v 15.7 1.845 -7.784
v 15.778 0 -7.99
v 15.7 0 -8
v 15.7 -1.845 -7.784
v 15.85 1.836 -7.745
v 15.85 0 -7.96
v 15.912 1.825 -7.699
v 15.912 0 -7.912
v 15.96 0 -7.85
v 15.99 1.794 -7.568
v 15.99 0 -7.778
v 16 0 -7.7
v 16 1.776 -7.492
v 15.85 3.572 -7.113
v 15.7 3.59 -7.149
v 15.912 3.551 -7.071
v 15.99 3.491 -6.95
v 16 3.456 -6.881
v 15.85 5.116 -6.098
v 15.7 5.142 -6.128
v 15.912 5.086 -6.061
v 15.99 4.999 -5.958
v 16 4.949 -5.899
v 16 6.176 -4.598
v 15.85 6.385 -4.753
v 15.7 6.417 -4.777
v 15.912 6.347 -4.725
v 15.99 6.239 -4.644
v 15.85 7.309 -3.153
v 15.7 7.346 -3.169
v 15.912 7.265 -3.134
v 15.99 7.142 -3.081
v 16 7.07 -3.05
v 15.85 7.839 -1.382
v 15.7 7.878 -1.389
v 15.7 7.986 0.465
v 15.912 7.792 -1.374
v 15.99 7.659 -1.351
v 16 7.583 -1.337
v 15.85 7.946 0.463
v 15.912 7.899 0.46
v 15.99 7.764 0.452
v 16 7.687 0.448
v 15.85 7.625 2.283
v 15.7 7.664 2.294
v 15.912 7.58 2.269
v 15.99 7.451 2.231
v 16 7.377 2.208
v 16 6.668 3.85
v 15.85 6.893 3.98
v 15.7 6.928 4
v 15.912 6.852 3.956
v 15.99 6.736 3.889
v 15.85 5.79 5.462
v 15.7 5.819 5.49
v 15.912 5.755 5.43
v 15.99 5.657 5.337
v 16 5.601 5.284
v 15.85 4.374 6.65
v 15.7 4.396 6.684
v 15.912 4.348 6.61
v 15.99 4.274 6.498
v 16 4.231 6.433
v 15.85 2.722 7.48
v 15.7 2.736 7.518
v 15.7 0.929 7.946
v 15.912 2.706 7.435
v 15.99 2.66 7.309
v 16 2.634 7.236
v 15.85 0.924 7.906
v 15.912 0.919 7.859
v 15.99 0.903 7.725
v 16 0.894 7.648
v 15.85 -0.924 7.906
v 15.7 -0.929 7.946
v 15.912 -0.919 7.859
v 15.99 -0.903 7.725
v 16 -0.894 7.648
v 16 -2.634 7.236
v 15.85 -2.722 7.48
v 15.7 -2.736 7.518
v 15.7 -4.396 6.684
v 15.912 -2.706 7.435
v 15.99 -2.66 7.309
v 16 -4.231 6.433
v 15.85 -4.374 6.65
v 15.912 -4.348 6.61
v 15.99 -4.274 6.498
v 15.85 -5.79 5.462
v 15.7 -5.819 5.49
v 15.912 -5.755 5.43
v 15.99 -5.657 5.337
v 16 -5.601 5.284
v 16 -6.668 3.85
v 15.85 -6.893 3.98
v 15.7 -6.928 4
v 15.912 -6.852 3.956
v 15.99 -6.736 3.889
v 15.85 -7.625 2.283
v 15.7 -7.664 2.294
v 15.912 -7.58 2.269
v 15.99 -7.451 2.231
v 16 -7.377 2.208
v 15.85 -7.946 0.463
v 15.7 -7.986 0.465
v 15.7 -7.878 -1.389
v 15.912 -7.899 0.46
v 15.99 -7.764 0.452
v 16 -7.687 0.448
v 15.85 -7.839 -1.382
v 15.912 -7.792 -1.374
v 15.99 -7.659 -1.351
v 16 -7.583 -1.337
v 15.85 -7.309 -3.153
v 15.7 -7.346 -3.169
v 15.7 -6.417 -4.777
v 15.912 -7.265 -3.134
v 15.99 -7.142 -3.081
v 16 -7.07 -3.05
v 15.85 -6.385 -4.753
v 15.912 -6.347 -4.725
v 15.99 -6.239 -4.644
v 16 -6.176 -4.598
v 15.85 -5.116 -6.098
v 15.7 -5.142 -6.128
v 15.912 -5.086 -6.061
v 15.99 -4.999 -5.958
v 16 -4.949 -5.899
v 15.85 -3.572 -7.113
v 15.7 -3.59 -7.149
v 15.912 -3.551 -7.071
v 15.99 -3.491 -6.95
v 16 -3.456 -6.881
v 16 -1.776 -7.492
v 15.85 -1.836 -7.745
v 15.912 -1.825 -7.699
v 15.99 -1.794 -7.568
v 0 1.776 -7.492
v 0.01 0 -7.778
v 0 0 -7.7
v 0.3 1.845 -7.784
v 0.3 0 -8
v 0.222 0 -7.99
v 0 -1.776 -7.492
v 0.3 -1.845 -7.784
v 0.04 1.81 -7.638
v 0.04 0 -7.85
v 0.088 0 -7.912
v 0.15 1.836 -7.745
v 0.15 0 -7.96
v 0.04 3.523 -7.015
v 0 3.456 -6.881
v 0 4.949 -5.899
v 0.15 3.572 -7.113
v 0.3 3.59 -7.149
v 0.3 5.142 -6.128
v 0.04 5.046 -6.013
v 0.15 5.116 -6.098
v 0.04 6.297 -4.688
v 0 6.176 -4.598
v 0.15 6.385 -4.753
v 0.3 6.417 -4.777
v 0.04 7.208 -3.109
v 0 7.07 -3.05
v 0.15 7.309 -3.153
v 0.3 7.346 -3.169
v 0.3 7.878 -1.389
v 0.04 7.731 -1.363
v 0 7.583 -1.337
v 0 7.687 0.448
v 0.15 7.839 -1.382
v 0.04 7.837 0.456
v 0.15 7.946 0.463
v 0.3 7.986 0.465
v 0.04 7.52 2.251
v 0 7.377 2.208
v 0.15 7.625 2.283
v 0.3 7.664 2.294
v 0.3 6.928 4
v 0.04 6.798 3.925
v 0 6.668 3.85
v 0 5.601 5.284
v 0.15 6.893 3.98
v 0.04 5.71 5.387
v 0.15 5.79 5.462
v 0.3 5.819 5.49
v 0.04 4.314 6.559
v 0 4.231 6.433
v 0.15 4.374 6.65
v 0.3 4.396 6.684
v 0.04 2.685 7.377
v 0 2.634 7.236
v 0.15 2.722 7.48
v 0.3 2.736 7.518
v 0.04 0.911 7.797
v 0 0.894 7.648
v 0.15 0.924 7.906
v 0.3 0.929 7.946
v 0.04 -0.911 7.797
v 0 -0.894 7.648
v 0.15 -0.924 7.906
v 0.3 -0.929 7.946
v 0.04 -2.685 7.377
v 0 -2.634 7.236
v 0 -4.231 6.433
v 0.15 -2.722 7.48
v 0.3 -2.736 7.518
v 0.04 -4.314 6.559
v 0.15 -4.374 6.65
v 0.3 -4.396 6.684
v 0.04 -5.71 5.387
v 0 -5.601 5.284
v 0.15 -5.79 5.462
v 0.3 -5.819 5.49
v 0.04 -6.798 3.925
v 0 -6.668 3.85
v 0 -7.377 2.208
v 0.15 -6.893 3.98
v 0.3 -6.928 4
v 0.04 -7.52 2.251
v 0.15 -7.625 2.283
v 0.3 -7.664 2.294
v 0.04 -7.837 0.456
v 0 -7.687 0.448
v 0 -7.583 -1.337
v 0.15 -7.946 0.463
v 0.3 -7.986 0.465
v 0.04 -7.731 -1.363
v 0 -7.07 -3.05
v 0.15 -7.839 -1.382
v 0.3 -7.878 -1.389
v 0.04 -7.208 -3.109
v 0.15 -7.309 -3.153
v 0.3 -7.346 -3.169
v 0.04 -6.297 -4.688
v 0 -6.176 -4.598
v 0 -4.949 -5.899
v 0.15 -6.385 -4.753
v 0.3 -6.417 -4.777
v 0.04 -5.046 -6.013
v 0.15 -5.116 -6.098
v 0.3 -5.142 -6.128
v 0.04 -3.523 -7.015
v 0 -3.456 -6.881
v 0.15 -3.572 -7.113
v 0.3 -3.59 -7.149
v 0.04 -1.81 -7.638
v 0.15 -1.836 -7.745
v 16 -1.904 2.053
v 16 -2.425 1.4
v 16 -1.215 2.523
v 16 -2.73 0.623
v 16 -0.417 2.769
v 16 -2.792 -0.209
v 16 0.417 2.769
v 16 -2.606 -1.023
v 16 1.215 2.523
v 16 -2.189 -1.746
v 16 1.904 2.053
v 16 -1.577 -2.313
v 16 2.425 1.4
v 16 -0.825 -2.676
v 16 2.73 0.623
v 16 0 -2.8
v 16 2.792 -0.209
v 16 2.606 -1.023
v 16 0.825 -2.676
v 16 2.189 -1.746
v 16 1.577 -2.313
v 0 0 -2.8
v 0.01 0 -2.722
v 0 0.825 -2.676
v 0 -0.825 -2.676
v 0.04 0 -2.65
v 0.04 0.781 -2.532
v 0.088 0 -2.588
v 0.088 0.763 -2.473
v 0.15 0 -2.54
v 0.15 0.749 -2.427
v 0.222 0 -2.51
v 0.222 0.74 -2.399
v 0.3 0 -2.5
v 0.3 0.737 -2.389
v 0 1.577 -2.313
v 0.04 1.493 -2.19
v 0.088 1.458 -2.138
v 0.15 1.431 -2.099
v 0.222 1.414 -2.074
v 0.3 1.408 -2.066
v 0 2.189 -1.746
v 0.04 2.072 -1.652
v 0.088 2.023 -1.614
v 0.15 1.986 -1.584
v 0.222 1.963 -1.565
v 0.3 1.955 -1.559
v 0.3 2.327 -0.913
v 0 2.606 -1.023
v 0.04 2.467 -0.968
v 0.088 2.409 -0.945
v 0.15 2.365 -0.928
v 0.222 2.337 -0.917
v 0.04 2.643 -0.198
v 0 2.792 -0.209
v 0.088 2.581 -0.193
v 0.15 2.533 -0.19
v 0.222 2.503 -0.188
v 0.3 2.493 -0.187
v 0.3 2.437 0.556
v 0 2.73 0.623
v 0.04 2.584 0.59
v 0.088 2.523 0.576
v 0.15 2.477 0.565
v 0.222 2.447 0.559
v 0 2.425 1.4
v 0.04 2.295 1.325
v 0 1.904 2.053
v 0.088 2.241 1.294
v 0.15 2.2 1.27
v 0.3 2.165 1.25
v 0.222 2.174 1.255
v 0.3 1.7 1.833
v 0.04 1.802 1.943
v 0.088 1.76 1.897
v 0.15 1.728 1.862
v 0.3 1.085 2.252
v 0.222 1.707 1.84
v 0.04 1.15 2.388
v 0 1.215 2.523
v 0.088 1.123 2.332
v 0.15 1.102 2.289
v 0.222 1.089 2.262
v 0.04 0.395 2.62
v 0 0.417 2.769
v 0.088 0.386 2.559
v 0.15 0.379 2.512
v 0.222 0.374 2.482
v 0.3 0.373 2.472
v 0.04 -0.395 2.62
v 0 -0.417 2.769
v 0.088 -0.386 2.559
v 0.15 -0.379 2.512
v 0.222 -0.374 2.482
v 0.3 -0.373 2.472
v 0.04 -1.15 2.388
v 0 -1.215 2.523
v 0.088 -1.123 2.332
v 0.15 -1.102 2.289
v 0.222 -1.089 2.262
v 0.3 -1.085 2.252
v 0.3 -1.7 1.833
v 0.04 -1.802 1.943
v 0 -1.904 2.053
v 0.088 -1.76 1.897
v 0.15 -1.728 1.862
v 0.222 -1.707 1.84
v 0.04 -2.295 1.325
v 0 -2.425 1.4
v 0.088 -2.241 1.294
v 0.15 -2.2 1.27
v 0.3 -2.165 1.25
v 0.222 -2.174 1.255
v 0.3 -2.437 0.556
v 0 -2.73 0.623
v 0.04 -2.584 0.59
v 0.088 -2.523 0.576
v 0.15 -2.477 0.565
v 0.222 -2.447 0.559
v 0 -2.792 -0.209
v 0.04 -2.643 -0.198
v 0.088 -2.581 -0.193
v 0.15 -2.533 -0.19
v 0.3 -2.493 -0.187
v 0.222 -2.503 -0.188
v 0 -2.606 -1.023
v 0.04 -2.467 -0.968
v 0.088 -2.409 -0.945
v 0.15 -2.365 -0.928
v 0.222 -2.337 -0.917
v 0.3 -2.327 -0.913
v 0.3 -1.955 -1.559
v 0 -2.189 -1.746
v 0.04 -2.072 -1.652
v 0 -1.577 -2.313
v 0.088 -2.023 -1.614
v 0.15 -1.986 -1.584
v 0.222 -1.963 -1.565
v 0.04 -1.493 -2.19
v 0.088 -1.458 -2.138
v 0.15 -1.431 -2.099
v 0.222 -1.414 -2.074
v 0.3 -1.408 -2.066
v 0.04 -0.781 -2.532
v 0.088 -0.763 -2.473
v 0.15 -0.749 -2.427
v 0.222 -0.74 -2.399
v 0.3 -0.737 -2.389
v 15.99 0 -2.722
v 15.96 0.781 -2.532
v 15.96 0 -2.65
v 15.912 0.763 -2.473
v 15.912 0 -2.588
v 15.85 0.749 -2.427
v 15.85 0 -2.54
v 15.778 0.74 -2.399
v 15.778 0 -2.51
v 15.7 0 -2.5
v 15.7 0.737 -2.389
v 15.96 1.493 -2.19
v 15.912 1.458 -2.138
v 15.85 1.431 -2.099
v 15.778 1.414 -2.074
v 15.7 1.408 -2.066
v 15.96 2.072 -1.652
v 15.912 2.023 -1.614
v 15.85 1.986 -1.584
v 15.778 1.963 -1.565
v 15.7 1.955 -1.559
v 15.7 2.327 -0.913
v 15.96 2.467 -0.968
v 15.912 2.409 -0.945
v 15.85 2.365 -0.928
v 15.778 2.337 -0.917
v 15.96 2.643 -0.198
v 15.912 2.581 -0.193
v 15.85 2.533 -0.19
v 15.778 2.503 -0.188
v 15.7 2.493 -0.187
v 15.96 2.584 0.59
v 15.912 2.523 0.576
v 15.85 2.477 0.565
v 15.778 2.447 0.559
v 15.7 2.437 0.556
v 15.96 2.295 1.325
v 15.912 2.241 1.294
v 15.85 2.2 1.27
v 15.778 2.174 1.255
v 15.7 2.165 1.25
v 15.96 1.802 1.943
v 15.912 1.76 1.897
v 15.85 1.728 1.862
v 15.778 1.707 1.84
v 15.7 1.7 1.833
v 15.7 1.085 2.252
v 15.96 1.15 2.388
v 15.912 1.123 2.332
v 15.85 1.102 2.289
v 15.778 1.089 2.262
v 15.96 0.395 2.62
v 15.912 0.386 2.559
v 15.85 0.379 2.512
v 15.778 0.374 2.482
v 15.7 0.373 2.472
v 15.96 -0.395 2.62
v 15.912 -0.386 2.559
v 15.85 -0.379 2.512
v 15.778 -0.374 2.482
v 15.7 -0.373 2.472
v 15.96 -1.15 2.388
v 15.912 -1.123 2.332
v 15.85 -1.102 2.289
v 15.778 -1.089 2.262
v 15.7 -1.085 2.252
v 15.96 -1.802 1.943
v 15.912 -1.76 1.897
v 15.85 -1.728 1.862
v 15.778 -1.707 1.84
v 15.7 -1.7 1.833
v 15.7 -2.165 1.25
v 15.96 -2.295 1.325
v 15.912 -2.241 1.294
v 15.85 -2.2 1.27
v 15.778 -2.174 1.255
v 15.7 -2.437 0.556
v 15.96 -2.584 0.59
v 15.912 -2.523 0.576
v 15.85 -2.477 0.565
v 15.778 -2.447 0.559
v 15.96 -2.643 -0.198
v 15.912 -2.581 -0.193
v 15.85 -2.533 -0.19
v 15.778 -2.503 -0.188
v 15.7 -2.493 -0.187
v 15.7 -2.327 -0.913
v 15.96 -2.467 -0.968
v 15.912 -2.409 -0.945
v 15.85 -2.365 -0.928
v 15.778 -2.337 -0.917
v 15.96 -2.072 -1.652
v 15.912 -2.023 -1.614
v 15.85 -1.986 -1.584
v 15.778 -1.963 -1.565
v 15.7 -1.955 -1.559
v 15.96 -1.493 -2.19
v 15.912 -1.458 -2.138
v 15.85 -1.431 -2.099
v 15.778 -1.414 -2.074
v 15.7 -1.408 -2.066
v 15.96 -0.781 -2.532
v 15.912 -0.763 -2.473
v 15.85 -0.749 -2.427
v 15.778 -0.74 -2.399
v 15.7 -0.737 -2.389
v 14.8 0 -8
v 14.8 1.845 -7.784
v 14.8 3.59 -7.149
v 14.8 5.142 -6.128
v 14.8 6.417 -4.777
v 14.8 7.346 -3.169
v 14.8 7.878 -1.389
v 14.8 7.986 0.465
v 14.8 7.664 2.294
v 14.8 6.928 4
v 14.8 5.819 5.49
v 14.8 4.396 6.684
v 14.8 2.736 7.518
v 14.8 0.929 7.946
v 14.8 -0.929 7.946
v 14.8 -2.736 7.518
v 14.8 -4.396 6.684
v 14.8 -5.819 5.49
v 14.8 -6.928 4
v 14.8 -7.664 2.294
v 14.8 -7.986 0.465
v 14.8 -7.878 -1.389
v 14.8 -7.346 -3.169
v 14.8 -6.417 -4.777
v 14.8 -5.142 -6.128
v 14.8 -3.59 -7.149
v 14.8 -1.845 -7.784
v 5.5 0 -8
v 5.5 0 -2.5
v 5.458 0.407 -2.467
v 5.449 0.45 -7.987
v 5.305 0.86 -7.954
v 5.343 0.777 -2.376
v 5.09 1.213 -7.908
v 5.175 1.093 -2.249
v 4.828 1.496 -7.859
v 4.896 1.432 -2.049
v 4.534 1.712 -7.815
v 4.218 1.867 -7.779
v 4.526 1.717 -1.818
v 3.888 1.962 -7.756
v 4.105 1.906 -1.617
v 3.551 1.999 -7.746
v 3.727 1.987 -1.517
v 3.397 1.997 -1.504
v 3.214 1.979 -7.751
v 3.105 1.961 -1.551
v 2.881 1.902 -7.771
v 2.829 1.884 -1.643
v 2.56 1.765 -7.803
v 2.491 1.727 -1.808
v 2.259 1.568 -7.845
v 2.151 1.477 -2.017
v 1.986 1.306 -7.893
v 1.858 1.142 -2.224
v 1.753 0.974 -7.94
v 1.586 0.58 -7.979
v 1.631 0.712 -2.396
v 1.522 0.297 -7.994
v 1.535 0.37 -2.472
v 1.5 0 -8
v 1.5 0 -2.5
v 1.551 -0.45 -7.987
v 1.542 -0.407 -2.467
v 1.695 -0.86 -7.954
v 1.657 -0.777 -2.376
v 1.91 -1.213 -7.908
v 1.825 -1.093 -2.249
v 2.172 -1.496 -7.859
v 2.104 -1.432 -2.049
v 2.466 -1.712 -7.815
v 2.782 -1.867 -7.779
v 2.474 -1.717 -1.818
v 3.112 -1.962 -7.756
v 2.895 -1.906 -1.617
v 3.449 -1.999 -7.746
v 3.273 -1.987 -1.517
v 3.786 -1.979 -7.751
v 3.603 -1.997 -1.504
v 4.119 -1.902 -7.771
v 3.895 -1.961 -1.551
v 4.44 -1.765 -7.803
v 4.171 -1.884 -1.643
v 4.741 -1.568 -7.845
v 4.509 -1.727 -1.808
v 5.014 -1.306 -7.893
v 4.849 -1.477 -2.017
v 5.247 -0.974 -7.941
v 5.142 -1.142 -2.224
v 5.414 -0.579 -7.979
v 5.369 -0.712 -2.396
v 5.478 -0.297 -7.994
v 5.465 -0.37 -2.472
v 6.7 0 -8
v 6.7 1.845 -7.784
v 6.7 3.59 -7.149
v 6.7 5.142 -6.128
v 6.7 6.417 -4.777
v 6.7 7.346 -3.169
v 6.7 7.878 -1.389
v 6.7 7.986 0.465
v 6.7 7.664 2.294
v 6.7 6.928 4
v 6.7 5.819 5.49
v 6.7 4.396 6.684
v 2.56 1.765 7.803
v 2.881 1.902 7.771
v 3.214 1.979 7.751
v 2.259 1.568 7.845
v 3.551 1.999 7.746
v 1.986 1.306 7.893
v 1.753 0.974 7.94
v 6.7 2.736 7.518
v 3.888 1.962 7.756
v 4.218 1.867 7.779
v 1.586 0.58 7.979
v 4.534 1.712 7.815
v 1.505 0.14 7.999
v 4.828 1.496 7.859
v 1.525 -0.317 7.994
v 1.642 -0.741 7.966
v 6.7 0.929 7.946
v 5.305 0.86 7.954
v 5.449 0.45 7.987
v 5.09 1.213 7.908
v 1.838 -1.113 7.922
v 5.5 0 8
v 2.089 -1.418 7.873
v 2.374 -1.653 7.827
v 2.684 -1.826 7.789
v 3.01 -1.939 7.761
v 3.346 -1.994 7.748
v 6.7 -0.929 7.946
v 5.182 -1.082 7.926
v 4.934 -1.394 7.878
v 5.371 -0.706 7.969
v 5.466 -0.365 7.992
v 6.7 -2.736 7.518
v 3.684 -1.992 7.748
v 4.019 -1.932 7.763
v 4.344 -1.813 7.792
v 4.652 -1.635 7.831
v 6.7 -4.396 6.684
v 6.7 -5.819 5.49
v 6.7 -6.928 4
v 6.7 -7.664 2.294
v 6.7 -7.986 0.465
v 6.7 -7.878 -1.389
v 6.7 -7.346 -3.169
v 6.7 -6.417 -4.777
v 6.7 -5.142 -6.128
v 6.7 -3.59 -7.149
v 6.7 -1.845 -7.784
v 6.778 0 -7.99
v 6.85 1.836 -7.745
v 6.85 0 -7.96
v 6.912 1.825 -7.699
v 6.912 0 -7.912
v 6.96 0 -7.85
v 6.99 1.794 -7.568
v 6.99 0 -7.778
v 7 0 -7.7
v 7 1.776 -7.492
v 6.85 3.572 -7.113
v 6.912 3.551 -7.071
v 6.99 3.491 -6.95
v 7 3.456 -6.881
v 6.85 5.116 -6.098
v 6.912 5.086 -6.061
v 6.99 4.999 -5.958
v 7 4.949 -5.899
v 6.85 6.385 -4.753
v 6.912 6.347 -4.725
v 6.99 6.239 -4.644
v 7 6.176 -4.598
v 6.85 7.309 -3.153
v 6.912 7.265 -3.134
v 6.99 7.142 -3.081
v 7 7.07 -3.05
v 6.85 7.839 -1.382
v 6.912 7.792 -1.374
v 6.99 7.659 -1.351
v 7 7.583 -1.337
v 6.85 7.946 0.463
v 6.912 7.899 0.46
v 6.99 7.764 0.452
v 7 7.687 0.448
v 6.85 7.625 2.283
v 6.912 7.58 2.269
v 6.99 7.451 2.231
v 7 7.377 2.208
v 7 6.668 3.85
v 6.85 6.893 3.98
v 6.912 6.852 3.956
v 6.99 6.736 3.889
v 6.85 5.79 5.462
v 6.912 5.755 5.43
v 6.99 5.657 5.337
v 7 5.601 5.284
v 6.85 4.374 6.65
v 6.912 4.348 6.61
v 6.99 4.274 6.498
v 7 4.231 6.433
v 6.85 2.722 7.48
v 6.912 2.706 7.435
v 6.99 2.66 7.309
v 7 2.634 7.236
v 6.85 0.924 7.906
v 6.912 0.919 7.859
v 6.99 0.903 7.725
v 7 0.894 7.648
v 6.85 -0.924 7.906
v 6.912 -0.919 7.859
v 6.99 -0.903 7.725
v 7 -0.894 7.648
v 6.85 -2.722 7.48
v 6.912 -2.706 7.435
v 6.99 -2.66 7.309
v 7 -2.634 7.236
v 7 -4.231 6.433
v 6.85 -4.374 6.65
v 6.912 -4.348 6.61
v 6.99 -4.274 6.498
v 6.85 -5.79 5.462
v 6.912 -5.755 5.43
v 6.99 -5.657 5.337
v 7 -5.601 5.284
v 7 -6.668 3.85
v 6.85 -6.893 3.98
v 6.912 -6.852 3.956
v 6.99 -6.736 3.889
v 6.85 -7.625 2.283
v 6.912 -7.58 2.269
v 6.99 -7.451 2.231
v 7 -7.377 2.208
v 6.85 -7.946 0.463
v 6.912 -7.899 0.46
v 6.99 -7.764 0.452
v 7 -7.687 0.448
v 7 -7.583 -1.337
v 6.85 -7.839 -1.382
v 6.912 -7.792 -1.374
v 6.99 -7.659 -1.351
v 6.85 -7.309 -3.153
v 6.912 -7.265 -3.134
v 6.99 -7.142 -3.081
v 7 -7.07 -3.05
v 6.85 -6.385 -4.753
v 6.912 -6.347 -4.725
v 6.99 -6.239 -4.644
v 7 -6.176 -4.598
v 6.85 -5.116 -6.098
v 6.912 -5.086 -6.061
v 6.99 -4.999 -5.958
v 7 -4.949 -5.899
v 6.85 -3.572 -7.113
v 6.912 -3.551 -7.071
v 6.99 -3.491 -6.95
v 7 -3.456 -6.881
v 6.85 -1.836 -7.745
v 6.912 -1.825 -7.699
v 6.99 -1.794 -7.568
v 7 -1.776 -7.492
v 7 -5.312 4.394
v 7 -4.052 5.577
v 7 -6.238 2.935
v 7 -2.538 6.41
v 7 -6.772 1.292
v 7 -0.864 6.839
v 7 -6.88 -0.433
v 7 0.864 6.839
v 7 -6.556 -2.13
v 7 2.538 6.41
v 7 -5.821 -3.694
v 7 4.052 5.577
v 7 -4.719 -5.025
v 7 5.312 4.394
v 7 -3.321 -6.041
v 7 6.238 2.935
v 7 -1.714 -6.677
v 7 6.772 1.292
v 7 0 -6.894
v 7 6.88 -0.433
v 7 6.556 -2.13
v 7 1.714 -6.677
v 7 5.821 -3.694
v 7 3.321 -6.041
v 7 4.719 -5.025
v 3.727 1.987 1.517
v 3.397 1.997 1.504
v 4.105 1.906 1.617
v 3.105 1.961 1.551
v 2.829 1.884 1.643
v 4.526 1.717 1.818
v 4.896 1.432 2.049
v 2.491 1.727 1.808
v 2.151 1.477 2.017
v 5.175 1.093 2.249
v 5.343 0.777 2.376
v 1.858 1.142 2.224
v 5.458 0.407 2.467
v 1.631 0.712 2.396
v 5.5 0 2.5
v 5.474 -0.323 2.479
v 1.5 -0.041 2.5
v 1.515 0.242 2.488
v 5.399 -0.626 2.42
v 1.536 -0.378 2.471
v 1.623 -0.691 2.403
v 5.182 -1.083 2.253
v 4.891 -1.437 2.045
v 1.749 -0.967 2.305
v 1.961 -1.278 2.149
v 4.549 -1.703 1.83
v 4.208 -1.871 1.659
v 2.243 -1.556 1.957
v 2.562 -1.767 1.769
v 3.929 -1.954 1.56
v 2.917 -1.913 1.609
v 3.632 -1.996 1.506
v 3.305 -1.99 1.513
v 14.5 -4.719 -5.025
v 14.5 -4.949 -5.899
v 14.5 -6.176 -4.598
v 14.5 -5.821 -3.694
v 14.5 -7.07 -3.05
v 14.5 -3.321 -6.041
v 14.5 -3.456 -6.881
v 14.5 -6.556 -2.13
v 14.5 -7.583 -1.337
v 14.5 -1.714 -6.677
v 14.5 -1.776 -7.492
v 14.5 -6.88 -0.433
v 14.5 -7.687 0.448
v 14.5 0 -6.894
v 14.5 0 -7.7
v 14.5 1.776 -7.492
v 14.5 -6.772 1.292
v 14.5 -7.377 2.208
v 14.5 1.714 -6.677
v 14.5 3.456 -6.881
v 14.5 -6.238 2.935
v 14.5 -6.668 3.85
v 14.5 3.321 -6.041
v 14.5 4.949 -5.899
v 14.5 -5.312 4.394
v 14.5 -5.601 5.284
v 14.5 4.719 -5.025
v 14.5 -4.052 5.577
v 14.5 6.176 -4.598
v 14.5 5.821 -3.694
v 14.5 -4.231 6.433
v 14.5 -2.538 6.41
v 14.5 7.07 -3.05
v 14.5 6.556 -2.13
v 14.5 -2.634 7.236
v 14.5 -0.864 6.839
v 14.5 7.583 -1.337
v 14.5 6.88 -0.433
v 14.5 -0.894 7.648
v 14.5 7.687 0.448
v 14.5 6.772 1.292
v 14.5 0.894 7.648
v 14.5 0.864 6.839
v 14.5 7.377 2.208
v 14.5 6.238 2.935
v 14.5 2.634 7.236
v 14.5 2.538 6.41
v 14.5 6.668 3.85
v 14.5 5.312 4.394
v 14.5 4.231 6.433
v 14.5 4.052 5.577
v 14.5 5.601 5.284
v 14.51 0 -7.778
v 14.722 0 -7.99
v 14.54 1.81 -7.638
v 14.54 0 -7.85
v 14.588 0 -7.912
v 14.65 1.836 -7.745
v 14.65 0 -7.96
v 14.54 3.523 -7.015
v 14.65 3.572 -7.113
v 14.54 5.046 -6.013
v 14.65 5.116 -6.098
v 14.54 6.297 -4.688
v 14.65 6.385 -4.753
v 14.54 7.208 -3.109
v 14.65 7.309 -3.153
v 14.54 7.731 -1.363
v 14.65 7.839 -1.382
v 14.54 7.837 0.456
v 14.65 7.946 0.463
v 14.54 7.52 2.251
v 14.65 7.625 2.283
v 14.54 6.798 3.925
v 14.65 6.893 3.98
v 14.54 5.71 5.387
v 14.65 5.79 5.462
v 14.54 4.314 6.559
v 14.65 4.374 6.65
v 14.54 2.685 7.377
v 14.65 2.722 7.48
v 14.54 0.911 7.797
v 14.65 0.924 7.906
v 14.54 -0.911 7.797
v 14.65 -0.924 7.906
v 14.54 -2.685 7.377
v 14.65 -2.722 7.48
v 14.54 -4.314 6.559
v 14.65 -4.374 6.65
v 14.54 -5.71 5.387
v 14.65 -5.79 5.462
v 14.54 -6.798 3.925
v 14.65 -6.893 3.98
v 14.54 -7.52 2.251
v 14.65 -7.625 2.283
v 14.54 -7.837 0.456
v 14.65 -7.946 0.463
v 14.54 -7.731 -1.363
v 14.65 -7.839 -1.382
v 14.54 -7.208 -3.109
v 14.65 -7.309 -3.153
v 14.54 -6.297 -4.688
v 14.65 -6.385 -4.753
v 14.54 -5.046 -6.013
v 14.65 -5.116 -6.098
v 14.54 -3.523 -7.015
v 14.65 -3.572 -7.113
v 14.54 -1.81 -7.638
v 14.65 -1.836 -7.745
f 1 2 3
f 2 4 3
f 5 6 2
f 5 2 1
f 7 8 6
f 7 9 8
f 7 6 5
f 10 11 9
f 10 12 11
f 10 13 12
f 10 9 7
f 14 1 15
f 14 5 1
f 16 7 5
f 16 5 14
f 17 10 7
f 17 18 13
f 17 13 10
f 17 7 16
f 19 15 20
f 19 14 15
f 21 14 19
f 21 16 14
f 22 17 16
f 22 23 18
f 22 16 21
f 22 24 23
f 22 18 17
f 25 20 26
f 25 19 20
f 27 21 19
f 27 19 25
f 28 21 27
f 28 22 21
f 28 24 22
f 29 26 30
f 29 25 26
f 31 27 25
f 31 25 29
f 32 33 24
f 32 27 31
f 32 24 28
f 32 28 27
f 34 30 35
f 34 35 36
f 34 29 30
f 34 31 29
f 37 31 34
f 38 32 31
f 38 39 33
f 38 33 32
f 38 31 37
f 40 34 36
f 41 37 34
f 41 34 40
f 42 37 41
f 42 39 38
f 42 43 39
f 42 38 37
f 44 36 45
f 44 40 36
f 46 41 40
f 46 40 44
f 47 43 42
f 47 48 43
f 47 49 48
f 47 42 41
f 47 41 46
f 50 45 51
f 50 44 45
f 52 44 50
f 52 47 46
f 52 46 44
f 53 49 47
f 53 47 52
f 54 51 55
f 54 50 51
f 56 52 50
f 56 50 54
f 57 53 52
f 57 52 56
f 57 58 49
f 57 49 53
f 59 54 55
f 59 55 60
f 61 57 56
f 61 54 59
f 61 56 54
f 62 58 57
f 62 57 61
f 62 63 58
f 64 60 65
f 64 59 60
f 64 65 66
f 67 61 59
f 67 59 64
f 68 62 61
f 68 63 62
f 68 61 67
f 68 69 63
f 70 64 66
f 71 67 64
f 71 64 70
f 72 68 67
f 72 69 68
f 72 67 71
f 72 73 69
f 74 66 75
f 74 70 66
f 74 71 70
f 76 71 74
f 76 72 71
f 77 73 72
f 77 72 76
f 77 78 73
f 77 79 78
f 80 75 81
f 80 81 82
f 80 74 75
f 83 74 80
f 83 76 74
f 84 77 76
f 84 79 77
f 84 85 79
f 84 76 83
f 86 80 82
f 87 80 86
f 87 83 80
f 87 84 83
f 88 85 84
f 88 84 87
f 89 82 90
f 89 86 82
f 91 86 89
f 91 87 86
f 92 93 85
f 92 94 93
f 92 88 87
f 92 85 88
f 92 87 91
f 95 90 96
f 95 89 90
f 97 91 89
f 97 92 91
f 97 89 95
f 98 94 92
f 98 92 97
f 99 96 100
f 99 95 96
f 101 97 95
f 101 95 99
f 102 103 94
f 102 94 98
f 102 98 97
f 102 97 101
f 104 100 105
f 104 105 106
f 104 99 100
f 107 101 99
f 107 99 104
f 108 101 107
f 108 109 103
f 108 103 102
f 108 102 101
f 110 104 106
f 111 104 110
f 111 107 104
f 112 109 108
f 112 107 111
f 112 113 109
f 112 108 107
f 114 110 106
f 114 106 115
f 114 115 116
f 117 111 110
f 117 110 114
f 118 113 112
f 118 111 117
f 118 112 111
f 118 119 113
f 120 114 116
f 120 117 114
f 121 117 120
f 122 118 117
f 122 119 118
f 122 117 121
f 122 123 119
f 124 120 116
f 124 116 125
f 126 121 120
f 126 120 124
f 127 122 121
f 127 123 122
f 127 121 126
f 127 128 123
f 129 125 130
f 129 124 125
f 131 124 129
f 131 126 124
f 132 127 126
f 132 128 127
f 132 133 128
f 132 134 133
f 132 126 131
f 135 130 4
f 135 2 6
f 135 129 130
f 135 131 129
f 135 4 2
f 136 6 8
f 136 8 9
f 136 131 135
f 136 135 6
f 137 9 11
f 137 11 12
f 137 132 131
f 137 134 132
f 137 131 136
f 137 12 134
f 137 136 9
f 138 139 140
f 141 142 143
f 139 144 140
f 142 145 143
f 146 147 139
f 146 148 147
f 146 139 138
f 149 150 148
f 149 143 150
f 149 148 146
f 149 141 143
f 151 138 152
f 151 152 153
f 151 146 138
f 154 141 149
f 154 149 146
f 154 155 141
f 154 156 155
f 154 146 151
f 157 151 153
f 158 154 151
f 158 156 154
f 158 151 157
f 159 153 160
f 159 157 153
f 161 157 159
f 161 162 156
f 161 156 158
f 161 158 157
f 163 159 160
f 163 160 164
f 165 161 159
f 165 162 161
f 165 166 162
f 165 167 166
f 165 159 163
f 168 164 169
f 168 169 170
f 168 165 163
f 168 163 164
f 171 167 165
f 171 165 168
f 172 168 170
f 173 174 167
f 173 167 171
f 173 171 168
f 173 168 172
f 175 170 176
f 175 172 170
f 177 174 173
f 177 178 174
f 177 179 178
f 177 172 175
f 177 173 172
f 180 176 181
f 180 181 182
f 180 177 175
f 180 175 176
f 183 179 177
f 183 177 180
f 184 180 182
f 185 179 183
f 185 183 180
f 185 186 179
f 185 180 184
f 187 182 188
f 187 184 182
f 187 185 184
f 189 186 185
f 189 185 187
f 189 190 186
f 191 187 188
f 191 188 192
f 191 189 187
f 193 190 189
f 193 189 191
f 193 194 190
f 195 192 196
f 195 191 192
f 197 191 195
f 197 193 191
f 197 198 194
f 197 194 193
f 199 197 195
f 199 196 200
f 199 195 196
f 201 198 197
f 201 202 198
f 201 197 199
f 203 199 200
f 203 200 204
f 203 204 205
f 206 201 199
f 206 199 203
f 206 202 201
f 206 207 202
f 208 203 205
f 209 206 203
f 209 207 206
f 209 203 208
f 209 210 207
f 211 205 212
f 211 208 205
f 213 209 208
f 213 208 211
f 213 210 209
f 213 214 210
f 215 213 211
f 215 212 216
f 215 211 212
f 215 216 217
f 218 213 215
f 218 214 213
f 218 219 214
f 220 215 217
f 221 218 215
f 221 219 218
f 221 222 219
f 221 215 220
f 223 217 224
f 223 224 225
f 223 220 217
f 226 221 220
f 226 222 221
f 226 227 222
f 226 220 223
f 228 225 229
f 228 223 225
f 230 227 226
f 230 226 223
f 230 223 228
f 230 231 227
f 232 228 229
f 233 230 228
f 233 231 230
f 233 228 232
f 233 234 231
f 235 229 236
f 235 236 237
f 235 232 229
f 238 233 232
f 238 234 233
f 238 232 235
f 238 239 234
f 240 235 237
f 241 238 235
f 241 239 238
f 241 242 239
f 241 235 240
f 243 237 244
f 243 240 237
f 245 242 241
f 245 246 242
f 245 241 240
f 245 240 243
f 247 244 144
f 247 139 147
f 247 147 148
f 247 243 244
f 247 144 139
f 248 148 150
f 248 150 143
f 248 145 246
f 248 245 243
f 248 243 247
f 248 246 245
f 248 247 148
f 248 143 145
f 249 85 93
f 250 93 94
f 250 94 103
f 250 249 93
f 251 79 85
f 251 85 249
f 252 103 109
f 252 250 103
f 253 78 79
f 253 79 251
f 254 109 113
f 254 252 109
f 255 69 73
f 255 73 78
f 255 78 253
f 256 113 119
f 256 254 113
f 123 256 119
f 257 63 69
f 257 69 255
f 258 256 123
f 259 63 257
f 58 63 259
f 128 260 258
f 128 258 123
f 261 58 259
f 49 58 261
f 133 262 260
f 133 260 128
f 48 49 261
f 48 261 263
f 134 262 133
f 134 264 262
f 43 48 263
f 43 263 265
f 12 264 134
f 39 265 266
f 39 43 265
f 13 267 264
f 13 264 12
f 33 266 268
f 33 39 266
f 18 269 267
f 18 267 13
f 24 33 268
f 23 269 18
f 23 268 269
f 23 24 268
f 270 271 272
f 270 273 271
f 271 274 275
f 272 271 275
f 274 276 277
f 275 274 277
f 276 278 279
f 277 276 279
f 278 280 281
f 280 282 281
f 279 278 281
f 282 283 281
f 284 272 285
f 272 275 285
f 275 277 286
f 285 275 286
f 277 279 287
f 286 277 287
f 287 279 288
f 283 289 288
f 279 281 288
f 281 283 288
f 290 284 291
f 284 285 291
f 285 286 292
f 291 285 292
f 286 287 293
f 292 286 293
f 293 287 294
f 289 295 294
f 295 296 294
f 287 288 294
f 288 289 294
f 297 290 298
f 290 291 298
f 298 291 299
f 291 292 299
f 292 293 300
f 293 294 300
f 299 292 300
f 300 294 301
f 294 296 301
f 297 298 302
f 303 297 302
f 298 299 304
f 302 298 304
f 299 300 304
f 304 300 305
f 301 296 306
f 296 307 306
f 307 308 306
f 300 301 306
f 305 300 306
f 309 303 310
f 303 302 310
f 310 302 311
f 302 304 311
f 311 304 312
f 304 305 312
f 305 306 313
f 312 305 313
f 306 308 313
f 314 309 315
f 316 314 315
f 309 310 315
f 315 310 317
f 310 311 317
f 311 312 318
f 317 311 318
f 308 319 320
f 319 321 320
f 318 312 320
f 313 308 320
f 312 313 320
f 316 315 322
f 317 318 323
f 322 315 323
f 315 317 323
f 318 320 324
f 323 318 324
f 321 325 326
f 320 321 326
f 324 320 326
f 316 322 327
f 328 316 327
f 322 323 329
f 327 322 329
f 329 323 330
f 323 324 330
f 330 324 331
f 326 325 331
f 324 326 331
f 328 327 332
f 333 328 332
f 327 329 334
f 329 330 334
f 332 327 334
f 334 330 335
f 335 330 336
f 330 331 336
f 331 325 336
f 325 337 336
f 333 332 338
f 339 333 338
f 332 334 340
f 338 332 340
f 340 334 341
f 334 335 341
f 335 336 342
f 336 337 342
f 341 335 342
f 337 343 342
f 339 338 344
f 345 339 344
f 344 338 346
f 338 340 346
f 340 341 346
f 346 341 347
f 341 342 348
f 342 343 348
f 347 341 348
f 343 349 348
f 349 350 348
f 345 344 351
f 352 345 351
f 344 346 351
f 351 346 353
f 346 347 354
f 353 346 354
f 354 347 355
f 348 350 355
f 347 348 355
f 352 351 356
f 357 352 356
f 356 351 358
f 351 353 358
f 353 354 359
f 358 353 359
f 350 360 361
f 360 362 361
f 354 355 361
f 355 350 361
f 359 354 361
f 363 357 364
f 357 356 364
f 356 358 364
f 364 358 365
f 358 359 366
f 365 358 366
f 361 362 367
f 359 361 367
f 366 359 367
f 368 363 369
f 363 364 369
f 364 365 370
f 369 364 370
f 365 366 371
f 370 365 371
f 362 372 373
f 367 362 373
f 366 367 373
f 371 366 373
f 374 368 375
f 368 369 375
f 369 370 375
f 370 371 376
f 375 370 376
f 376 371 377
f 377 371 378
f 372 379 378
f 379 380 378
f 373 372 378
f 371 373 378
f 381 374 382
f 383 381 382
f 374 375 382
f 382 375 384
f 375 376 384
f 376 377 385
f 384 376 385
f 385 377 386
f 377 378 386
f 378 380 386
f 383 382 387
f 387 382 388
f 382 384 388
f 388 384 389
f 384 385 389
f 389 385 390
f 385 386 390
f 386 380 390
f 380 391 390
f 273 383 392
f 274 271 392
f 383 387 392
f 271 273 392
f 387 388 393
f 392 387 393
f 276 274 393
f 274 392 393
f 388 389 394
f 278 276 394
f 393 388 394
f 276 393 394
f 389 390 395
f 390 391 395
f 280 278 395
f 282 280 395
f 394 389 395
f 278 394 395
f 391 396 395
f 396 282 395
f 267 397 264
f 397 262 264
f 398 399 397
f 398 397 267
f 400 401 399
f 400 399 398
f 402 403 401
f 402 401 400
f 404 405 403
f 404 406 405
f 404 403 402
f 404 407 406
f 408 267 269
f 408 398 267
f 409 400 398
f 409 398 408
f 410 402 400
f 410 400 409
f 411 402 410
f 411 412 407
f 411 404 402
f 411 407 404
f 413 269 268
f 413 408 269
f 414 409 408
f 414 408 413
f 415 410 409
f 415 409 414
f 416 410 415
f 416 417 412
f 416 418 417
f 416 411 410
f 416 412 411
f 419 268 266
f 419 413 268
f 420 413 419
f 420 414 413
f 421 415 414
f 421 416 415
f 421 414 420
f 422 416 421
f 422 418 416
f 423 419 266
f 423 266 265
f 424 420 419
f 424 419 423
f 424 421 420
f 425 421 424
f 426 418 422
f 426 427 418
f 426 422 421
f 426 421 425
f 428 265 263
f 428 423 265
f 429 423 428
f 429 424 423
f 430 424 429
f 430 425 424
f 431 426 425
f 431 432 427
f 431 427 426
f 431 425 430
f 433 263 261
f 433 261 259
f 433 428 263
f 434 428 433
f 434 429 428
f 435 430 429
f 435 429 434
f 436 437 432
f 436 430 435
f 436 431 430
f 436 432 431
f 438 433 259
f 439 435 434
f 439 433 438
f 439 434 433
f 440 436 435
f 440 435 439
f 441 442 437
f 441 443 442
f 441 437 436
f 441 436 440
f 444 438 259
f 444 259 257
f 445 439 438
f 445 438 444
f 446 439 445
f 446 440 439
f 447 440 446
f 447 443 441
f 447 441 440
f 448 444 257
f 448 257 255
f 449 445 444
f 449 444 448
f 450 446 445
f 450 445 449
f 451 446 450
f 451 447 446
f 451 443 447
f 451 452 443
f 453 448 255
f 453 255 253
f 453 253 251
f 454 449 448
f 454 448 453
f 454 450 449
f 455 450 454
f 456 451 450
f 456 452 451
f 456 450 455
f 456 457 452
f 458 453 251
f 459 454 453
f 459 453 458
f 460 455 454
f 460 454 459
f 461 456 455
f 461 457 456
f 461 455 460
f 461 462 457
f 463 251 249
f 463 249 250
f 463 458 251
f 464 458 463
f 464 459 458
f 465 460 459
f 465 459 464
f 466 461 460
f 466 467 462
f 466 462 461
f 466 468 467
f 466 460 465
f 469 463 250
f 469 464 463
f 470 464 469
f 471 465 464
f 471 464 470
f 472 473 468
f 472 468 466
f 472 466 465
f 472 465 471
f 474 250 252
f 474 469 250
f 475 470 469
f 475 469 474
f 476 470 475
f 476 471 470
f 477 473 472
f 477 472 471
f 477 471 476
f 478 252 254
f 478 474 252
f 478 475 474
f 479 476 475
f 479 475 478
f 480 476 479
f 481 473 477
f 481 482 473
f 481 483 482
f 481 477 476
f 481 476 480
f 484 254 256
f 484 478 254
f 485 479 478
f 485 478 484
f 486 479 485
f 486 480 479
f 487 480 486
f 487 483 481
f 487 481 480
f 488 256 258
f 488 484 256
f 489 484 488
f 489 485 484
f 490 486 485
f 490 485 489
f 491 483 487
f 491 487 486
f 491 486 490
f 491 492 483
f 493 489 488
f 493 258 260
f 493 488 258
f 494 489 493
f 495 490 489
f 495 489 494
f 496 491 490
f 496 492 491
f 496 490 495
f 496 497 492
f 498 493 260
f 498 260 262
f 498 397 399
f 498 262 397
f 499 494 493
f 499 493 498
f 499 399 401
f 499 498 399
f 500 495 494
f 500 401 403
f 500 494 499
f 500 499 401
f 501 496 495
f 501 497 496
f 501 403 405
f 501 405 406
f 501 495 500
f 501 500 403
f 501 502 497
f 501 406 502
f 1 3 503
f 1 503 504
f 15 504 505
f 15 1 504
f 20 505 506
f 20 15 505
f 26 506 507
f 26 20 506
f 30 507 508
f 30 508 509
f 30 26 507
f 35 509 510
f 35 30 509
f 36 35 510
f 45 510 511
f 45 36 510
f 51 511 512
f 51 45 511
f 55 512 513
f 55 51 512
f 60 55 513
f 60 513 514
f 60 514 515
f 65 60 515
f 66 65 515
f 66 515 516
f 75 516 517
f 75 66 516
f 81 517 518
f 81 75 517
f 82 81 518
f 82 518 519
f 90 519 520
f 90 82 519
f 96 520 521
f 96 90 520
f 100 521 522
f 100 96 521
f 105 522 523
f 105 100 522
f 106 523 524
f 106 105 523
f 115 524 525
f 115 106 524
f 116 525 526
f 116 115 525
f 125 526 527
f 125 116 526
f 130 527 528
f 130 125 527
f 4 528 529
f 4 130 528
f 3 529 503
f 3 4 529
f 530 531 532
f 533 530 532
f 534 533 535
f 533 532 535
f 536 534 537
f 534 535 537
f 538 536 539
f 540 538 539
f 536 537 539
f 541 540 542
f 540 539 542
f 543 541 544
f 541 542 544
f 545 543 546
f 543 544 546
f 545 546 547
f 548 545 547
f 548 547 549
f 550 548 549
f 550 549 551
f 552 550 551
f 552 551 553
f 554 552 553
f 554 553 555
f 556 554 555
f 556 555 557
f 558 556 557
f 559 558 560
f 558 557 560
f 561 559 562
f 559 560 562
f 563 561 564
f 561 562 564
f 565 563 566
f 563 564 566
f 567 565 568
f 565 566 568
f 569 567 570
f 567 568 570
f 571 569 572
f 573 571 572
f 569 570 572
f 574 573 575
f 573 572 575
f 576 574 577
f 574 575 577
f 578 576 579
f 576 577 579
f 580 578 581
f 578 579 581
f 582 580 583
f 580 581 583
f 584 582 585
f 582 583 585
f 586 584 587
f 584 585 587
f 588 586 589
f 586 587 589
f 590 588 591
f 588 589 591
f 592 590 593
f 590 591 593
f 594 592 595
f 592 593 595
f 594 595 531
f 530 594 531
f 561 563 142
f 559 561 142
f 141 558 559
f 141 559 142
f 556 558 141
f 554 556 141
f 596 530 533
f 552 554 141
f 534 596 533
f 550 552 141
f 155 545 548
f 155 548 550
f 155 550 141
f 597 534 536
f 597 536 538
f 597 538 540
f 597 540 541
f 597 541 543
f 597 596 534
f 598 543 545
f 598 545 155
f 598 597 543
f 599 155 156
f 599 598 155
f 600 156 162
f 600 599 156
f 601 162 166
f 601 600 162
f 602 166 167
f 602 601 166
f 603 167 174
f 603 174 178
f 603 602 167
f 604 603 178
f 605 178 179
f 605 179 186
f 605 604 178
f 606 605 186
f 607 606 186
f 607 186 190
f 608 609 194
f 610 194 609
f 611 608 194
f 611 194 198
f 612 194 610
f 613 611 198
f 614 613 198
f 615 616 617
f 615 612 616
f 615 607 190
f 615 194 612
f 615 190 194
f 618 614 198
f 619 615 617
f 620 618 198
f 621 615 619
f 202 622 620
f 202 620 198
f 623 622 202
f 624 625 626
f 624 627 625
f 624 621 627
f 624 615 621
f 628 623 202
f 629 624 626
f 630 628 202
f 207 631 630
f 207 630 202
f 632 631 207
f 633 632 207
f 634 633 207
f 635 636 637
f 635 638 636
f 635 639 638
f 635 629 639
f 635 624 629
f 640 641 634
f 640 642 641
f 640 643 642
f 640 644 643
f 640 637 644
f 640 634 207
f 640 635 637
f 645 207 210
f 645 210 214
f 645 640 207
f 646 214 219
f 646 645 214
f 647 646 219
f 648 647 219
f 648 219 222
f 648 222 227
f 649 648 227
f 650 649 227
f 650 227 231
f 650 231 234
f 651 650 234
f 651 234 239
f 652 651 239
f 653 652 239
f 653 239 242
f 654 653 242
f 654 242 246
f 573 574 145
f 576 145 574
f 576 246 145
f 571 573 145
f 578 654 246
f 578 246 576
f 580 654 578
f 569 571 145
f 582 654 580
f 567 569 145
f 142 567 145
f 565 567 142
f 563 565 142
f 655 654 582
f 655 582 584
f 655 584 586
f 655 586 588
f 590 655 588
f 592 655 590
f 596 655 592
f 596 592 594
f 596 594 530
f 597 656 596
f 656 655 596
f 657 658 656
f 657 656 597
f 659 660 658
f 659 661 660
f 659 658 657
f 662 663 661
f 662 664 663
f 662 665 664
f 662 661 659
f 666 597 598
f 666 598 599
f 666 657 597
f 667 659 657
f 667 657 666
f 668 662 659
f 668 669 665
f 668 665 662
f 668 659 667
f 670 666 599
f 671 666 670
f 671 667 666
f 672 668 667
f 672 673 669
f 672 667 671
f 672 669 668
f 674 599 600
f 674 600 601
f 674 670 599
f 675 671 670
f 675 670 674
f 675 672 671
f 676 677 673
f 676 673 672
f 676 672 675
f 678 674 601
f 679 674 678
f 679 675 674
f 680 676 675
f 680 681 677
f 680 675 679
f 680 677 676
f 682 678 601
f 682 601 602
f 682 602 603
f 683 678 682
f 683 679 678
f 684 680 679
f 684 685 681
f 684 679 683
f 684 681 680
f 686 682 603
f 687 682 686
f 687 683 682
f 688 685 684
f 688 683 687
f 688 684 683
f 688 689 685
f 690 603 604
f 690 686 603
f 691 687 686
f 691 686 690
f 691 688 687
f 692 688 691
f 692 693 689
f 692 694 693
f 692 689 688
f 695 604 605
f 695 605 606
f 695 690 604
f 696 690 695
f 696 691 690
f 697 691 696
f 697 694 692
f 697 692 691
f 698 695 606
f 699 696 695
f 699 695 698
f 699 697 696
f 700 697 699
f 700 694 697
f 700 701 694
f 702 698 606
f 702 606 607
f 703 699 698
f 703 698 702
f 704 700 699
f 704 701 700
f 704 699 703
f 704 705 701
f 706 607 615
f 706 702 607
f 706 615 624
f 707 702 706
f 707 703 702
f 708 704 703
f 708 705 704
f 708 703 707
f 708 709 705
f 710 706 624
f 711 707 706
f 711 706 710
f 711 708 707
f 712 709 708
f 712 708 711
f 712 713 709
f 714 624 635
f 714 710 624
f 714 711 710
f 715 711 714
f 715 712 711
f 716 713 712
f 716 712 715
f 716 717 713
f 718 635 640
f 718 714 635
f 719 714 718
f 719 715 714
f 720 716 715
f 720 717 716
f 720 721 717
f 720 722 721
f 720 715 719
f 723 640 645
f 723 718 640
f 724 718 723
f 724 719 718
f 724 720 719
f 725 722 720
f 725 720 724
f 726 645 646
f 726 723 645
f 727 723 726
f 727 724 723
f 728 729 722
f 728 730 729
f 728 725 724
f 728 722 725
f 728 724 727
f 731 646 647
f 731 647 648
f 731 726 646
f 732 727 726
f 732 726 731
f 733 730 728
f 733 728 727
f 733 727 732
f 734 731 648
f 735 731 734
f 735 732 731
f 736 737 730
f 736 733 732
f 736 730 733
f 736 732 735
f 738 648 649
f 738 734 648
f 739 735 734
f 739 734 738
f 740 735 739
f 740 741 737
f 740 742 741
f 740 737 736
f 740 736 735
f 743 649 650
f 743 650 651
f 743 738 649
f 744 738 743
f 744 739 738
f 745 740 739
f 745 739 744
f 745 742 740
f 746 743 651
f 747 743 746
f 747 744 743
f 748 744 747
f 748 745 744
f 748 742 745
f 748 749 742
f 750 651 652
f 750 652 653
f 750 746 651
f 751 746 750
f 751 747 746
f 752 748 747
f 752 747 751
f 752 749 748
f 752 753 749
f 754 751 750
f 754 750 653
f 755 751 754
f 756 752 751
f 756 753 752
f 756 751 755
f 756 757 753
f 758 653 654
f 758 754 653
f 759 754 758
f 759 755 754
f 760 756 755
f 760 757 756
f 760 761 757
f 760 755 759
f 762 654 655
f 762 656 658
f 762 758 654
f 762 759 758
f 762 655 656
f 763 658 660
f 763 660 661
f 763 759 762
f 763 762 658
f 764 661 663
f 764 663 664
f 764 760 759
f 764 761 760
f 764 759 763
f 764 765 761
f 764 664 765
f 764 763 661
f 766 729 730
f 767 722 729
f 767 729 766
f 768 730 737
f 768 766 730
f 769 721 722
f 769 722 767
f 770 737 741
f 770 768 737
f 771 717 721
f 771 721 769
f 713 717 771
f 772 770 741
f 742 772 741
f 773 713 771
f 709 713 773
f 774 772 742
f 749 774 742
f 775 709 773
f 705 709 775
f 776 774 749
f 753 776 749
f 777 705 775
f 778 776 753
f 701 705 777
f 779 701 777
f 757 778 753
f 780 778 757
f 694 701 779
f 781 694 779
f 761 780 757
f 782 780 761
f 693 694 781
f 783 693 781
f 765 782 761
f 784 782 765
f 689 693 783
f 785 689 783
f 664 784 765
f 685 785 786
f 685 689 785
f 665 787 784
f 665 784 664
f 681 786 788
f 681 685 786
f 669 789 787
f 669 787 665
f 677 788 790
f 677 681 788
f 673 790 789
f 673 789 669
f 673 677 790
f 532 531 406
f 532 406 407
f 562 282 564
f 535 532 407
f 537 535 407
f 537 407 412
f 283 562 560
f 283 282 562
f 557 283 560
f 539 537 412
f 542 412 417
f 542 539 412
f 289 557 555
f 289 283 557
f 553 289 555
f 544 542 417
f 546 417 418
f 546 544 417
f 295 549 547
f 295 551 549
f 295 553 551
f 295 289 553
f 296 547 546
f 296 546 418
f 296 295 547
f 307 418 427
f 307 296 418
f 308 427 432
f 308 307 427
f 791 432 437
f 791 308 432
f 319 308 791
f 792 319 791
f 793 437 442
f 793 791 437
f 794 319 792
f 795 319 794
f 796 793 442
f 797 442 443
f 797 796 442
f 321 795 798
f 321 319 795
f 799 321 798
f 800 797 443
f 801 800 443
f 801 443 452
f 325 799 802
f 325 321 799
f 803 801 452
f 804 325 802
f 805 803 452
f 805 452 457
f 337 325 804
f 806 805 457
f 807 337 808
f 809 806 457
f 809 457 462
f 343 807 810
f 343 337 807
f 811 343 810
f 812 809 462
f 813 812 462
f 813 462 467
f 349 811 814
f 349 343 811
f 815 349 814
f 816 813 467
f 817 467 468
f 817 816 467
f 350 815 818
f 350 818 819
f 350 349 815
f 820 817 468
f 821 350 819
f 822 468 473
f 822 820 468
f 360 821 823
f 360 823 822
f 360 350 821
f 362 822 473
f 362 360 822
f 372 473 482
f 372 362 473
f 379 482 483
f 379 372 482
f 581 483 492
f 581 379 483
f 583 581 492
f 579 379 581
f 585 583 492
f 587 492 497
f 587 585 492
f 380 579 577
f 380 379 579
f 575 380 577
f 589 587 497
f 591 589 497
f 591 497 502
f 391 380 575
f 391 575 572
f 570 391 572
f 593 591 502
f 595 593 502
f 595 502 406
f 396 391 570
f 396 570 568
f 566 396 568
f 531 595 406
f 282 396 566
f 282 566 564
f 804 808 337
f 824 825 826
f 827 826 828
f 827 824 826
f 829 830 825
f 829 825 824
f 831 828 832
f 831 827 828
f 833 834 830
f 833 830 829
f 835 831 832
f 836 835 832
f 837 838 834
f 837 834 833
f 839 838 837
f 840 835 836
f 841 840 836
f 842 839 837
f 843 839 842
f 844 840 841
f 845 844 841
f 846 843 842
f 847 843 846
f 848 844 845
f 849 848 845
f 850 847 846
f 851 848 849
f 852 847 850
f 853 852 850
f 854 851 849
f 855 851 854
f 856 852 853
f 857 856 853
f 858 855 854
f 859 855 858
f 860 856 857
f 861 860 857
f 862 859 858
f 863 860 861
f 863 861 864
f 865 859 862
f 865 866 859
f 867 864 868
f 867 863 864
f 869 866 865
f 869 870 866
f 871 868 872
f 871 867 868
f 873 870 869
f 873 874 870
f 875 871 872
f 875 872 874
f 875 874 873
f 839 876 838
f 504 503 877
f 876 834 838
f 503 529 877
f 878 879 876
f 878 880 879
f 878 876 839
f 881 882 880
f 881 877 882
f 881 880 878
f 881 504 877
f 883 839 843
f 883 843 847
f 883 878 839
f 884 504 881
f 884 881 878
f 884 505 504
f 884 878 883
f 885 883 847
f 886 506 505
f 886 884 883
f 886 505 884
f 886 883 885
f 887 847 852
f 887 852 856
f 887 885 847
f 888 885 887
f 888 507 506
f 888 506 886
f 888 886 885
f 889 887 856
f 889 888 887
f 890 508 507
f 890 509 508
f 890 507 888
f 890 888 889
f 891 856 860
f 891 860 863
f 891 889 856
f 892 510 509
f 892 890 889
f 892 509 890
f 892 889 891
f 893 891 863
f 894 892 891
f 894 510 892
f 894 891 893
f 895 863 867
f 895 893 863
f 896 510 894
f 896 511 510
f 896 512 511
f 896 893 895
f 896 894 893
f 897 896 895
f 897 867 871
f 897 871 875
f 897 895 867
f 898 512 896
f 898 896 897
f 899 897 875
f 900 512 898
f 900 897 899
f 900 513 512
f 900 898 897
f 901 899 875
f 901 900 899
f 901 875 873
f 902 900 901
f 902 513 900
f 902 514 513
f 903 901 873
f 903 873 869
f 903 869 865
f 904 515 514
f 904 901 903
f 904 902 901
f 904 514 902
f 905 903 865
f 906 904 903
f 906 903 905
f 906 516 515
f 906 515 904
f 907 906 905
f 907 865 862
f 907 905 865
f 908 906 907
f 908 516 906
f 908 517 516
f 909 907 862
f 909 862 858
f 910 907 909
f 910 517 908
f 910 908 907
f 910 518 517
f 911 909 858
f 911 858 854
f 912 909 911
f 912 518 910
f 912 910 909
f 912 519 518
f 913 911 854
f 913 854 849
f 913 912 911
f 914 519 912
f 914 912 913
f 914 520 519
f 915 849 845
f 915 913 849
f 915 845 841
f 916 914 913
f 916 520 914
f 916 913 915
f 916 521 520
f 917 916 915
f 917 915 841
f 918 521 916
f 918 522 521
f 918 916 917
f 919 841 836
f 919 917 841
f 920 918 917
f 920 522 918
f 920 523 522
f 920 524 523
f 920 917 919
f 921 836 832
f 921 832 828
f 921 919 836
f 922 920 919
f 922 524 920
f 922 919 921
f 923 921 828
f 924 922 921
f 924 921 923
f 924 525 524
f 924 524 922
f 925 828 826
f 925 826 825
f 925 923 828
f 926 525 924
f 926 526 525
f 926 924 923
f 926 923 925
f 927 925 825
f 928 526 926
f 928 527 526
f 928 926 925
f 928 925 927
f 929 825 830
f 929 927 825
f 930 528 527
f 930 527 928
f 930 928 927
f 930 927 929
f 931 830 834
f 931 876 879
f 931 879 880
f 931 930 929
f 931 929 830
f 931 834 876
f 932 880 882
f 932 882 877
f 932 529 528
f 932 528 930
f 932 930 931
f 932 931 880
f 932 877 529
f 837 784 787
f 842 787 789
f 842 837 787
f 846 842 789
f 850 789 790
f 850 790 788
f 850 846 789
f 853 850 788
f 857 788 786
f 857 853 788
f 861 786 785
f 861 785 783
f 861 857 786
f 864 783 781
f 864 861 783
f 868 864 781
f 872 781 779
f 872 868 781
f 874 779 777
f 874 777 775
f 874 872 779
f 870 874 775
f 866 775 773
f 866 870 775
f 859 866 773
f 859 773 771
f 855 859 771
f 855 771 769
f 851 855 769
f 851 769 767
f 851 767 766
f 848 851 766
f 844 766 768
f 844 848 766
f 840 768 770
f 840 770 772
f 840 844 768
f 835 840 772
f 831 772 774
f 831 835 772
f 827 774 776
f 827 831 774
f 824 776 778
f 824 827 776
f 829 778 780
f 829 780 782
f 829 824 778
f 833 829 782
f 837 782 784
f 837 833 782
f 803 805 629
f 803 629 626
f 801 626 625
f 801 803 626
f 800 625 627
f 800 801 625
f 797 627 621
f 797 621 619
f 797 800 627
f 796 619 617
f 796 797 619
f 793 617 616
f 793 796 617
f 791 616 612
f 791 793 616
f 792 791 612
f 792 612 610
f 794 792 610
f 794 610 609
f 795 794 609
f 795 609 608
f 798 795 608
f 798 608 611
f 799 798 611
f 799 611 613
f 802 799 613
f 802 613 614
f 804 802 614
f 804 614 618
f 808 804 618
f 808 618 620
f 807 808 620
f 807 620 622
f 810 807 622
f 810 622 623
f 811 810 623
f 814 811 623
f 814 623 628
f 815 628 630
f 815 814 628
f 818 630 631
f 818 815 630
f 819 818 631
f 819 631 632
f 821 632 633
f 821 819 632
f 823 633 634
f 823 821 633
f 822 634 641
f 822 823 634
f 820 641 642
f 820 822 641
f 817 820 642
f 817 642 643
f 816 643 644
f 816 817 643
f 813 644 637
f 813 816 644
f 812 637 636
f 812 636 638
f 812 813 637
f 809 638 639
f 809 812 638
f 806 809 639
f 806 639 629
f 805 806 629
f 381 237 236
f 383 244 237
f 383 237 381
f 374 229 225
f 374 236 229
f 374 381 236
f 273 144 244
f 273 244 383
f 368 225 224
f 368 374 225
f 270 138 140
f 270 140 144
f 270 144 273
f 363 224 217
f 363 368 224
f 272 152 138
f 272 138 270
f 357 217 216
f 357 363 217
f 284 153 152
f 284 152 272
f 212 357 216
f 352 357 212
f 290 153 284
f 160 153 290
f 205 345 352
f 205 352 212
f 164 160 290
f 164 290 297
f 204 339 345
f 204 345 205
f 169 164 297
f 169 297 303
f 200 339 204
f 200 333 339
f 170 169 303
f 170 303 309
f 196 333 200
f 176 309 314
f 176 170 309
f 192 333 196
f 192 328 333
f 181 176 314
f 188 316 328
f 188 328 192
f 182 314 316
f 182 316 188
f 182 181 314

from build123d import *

# Parameters (mm, degrees)
FILLET1_R               = 0.3
SKETCH2_R               = 2
CUT_EXTRUDE1_DEPTH      = 9.0000001
CUT_EXTRUDE1_DEPTH_BACK = 9


with BuildPart() as part:
    # Sketch1 → Revolve1 (revolve)
    with BuildSketch(Plane(origin=(0, 0, 0), x_dir=(1, 0, 0), z_dir=(0, 1, 0))):
        Polygon((0, 2.5), (0, 8), (7, 8), (7, 6.89378315), (14.5, 6.89378315), (14.5, 8), (16, 8), (16, 2.5), align=None)
    revolve(axis=Axis((0, 0, 0), (1, 0, 0)))

    # Fillet1
    fillet1_edges = [part.edges().sort_by_distance(p)[0] for p in [
        (0, 0, 2.5),
        (16, 0, 2.5),
        (16, 0, 8),
        (14.5, 0, 8),
        (7, 0, 8),
        (0, 0, 8),
    ]]
    fillet(fillet1_edges, radius=FILLET1_R)

    # Sketch2 → Cut-Extrude1 (cut, two sides)
    with BuildSketch(Plane.XY) as cut_extrude1_sk:
        with Locations((3.5, 0)):
            Circle(SKETCH2_R)
    extrude(amount=CUT_EXTRUDE1_DEPTH, mode=Mode.SUBTRACT)
    extrude(cut_extrude1_sk.sketch, amount=-CUT_EXTRUDE1_DEPTH_BACK, mode=Mode.SUBTRACT)


solid = part.part
